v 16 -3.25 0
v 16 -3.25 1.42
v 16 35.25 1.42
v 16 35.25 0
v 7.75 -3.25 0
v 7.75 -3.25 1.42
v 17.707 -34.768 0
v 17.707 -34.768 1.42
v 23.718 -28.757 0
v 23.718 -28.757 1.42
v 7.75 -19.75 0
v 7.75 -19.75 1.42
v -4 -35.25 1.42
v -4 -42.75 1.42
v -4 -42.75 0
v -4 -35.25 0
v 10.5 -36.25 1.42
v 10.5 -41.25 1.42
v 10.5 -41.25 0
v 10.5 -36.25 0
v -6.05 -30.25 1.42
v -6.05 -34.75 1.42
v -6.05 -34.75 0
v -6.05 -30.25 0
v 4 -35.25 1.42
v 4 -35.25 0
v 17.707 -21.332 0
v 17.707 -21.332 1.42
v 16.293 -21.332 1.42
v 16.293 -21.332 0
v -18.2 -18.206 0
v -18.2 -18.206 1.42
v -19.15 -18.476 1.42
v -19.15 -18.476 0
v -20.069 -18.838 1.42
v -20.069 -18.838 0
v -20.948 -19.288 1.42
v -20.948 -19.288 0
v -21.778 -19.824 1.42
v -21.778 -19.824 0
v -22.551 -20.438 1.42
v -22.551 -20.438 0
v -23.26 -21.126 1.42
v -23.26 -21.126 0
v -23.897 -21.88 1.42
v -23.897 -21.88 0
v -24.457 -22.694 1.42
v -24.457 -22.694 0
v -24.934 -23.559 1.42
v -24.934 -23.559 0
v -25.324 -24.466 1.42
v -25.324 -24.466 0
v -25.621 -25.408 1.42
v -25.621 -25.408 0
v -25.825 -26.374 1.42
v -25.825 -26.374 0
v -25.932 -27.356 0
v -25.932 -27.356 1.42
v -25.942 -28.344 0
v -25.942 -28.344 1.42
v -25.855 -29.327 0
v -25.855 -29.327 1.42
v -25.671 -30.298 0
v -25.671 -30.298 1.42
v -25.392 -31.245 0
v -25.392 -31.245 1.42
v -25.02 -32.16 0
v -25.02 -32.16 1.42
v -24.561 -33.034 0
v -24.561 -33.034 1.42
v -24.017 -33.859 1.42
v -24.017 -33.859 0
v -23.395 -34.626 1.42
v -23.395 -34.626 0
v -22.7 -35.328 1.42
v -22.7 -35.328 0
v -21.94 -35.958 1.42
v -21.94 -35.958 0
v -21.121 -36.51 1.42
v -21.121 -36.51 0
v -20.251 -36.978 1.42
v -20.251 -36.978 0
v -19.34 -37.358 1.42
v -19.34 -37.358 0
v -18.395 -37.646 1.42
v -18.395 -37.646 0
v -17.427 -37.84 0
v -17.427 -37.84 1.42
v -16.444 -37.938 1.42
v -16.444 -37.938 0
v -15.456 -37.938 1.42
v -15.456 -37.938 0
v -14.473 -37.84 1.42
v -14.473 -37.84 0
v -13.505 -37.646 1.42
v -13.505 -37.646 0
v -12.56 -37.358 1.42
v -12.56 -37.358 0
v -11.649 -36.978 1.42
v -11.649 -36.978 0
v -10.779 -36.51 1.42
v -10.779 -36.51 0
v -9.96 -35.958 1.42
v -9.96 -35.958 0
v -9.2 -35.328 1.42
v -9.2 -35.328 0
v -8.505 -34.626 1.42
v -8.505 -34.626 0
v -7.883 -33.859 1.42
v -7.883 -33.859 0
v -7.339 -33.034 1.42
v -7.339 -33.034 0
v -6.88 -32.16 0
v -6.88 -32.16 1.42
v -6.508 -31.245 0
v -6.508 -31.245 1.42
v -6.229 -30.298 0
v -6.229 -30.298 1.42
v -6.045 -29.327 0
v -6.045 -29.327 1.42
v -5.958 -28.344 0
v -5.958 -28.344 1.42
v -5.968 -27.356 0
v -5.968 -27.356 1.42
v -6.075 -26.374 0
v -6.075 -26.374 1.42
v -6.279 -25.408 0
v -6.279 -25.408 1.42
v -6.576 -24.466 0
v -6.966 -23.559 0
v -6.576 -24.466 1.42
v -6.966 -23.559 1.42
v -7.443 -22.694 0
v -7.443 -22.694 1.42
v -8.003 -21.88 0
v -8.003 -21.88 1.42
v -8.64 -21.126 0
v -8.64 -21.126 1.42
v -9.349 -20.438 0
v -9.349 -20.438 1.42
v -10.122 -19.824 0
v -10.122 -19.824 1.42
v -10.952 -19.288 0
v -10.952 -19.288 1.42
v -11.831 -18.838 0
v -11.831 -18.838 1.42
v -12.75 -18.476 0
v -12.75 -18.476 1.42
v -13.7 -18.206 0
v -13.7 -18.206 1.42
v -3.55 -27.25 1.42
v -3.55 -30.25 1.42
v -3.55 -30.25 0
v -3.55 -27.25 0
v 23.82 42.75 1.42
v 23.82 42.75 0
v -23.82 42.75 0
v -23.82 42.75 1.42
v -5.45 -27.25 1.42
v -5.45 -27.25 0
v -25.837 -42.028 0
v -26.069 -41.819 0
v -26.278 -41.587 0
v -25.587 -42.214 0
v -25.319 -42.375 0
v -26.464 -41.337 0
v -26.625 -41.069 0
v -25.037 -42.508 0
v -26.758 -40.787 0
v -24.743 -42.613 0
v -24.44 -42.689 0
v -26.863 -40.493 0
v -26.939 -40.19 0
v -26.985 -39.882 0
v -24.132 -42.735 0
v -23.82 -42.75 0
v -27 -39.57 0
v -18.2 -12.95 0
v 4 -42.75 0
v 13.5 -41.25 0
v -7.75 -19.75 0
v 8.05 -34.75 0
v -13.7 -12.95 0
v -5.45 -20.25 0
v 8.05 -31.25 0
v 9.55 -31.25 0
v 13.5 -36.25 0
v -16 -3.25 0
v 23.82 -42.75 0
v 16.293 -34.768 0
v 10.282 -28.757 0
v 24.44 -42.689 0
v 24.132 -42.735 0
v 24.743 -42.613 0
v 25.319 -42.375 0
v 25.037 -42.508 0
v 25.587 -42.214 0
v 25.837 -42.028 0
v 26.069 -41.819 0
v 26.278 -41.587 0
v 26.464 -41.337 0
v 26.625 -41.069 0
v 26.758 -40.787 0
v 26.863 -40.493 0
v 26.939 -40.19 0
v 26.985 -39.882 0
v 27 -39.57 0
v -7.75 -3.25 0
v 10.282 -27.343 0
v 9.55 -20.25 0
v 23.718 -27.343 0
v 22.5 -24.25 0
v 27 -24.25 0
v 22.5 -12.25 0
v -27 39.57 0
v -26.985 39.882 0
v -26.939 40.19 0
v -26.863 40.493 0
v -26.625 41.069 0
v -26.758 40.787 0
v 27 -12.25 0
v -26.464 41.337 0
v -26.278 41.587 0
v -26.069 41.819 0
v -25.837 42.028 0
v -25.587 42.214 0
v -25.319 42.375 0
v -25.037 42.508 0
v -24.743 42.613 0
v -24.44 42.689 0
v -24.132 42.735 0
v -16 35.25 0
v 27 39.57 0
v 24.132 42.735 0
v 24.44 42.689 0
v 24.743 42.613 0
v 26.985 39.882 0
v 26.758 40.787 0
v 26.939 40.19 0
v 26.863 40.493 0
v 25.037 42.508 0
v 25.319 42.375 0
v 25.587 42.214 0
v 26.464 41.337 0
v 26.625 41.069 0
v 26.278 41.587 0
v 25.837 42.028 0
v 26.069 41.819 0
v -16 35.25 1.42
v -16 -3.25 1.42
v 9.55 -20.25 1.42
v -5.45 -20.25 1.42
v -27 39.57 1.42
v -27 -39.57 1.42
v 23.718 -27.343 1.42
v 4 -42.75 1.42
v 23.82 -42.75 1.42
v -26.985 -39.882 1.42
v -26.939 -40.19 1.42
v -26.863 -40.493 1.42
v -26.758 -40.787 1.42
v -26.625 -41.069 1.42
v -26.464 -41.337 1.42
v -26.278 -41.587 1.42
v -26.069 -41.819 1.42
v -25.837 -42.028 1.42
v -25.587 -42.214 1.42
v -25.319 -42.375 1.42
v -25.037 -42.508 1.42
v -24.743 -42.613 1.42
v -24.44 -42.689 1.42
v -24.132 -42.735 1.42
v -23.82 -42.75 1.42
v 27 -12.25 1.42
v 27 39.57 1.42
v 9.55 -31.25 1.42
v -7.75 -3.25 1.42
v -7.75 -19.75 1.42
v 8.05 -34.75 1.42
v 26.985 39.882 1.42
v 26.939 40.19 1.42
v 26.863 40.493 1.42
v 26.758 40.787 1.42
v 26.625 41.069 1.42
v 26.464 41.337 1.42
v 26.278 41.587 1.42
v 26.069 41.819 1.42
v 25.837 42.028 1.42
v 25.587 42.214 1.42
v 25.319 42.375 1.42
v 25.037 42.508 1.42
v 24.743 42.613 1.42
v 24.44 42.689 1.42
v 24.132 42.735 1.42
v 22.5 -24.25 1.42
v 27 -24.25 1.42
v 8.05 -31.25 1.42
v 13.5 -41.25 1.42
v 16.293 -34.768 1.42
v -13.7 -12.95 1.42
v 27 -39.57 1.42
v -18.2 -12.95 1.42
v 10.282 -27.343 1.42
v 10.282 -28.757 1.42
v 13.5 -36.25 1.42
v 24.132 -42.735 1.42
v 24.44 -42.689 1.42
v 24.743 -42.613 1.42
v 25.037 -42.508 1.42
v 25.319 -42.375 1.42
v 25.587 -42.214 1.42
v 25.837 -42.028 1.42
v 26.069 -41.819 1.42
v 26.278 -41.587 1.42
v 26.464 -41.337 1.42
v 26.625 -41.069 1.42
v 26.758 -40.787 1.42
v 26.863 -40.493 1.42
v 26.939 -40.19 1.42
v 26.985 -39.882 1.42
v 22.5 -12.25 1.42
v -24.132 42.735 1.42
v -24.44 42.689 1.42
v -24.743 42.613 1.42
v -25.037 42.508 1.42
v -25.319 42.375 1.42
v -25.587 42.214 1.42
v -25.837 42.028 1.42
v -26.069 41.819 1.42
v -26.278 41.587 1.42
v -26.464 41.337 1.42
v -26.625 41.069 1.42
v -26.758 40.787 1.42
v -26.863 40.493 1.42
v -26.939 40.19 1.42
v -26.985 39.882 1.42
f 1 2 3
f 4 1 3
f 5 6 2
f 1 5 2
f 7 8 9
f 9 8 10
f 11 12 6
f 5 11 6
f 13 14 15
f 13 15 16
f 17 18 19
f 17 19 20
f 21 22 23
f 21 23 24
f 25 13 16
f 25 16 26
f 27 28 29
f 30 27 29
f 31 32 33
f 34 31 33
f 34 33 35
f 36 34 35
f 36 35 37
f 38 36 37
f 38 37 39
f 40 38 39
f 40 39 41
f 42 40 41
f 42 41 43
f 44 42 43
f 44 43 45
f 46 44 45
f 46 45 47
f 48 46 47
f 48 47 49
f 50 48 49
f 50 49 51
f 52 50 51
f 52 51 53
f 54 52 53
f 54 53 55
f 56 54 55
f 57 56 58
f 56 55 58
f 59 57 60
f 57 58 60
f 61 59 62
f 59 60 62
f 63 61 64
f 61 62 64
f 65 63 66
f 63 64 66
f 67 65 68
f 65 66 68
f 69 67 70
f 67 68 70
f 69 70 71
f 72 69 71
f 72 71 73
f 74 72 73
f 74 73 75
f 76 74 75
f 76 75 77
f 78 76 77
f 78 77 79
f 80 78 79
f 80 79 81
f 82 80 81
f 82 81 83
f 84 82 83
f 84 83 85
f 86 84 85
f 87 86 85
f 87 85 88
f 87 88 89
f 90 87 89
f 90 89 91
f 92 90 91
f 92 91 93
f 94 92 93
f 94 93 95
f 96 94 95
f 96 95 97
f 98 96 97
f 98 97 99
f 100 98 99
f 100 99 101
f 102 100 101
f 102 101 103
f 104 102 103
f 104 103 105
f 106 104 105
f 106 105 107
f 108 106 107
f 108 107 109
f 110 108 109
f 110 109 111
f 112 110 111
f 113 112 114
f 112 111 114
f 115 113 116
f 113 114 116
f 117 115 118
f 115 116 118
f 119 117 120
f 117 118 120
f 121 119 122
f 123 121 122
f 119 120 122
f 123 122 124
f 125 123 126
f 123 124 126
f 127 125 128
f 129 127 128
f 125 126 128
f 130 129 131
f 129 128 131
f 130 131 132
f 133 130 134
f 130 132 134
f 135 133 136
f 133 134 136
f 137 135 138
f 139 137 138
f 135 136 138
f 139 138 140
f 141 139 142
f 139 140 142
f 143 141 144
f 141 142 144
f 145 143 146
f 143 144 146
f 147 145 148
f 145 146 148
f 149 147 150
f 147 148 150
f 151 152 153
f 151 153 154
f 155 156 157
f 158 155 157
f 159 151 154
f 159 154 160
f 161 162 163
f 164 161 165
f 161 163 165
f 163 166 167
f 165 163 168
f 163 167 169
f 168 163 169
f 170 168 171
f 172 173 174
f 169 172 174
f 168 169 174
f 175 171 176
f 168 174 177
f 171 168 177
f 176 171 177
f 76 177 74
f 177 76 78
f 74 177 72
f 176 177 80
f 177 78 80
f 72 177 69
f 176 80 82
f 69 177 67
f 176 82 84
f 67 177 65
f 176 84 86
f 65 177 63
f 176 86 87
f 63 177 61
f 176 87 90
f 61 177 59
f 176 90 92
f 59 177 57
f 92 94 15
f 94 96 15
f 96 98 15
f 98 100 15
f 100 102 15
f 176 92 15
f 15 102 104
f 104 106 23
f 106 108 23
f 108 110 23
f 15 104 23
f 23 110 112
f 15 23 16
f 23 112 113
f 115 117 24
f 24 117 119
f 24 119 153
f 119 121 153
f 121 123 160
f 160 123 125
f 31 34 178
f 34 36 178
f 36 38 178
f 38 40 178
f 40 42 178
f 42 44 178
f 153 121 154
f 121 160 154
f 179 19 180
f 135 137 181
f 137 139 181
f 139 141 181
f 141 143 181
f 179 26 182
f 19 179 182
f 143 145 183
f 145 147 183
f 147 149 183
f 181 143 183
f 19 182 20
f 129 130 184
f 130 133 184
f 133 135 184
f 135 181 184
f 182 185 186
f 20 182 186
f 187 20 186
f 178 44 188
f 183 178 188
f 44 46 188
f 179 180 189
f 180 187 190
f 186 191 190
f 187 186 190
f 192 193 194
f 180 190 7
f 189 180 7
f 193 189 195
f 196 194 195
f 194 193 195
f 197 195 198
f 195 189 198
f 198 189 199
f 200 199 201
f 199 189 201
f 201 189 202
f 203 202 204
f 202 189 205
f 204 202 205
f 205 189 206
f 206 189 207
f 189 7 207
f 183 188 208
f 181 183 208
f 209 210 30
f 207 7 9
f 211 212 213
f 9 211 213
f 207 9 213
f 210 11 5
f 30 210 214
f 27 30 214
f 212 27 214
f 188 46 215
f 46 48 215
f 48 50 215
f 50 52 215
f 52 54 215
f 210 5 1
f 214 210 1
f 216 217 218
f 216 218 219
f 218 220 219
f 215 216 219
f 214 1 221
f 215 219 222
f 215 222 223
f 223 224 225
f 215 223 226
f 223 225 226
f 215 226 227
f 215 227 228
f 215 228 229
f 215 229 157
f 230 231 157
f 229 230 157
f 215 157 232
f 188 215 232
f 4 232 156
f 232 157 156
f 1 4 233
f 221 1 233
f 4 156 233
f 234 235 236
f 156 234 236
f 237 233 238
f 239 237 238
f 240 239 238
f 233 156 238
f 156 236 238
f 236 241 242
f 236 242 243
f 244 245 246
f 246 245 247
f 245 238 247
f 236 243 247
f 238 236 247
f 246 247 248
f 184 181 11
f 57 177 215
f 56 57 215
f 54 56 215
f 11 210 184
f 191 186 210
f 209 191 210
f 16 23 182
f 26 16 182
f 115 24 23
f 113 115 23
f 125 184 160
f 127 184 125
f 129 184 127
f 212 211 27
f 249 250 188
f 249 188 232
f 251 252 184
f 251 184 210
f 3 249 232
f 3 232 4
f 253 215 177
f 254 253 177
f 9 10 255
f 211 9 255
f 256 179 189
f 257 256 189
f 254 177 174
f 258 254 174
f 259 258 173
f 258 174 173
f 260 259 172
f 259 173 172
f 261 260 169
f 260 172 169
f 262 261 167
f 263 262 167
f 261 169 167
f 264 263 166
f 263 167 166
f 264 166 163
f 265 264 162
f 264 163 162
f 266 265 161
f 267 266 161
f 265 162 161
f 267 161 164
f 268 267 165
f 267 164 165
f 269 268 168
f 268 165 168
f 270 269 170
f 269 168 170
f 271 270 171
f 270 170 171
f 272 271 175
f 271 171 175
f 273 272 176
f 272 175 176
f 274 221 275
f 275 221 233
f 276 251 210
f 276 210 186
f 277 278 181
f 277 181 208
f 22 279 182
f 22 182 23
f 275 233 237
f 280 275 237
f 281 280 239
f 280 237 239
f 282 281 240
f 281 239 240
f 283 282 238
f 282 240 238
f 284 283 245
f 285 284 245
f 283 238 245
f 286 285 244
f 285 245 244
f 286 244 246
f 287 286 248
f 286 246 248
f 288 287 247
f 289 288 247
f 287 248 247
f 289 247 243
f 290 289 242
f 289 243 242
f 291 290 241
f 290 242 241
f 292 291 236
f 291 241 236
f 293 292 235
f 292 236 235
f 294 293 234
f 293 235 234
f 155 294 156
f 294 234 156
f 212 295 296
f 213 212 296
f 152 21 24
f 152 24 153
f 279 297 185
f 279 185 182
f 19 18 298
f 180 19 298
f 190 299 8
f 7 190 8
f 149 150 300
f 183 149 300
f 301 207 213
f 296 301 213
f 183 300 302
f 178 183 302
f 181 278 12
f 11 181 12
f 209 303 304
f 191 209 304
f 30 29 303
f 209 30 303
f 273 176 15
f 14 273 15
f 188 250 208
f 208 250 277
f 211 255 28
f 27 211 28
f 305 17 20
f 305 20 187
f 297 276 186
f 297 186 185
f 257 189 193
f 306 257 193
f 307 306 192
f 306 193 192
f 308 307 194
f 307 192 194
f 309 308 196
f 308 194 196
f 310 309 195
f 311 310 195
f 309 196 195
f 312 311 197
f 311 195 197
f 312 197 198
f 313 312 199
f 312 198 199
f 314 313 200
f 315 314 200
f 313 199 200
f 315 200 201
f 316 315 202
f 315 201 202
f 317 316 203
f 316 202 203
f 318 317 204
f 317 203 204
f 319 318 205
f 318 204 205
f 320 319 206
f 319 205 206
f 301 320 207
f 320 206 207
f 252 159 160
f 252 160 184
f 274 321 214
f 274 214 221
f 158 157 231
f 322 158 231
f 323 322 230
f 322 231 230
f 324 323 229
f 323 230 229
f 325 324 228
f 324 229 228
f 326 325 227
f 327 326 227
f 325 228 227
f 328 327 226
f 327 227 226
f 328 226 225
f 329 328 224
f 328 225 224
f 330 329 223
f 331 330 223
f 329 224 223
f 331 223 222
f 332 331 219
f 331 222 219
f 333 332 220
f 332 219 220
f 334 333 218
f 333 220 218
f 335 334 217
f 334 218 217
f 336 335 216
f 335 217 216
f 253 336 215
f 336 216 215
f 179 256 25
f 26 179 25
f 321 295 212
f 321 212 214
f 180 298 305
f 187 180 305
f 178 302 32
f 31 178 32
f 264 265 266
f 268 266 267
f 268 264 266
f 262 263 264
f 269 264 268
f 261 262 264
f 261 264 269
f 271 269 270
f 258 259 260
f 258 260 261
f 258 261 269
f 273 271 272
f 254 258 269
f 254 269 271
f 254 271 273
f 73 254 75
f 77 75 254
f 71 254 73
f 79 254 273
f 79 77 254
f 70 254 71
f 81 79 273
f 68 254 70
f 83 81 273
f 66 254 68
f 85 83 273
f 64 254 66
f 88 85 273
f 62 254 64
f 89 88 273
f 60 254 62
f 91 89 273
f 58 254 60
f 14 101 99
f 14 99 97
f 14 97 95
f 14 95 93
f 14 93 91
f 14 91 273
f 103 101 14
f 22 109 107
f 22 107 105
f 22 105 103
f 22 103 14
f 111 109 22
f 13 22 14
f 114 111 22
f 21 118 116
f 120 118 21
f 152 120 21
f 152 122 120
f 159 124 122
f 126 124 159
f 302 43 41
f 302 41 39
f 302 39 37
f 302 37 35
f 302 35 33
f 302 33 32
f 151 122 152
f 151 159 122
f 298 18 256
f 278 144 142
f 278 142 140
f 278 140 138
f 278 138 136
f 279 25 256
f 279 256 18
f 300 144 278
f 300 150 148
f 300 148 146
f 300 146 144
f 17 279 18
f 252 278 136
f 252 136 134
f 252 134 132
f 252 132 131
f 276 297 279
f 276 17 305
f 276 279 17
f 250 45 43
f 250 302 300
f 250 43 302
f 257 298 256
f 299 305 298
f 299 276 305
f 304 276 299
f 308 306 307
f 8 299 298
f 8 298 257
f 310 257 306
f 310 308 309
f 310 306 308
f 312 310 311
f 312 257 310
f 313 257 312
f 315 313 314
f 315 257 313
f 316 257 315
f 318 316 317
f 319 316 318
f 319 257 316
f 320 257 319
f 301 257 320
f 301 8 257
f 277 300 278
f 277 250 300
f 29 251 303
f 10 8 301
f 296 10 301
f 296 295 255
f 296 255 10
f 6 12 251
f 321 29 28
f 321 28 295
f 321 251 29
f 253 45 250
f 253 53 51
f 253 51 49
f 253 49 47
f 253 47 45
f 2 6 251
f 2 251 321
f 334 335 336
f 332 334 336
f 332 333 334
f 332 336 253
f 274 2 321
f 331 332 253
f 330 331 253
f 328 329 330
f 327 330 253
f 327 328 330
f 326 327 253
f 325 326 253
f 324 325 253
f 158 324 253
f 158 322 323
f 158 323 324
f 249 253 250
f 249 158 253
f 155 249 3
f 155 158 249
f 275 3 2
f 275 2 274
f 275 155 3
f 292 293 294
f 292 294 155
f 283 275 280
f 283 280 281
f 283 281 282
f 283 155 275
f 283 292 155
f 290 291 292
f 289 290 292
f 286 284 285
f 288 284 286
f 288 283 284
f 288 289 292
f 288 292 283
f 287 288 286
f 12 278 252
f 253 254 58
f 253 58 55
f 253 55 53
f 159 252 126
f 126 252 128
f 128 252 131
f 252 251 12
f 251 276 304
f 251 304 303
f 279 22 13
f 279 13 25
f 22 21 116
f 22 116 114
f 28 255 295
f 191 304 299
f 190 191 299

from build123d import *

# Parameters (mm, degrees)
EXTRUDE_1_DEPTH     = 1.42
CUT_EXTRUDE_1_REACH = 52.582
SKETCH_2_W          = 32
SKETCH_2_H          = 38.5
SKETCH_2_W_2        = 15.5
SKETCH_2_H_2        = 16.5
CUT_EXTRUDE_2_REACH = 52.582
SKETCH_3_R          = 10
CUT_EXTRUDE_3_REACH = 52.582
CUT_EXTRUDE_4_REACH = 52.582
SKETCH_5_W          = 8
SKETCH_5_H          = 7.5
CUT_EXTRUDE_5_REACH = 52.582
SKETCH_6_W          = 3
SKETCH_6_H          = 5
CUT_EXTRUDE_6_REACH = 52.582
SKETCH_7_W          = 4.5
SKETCH_7_H          = 12


with BuildPart() as part:
    # 草图1 → 凸台-拉伸1 (new body)
    with BuildSketch(Plane.XY):
        with BuildLine():
            Line((-23.82, -42.75), (23.82, -42.75))
            ThreePointArc((23.82, -42.75), (26.068599564, -41.818599564), (27, -39.57))
            Line((27, -39.57), (27, 39.57))
            ThreePointArc((27, 39.57), (26.068599564, 41.818599564), (23.82, 42.75))
            Line((23.82, 42.75), (-23.82, 42.75))
            ThreePointArc((-23.82, 42.75), (-26.068599564, 41.818599564), (-27, 39.57))
            Line((-27, 39.57), (-27, -39.57))
            ThreePointArc((-27, -39.57), (-26.068599564, -41.818599564), (-23.82, -42.75))
        make_face()
    extrude(amount=EXTRUDE_1_DEPTH)

    # 草图2 → 切除-拉伸1 (cut, up to next)
    with BuildSketch(Plane.XY.offset(1.42), mode=Mode.PRIVATE) as cut_extrude_1_sk1:
        with Locations((0, 16)):
            Rectangle(SKETCH_2_W, SKETCH_2_H)
    cut_extrude_1_tool1 = extrude(cut_extrude_1_sk1.sketch, amount=-CUT_EXTRUDE_1_REACH, mode=Mode.PRIVATE) & part.part
    # 草图2 → 切除-拉伸1 (cut, up to next)
    with BuildSketch(Plane.XY.offset(1.42), mode=Mode.PRIVATE) as cut_extrude_1_sk2:
        with Locations((0, -11.5)):
            Rectangle(SKETCH_2_W_2, SKETCH_2_H_2)
    cut_extrude_1_tool2 = extrude(cut_extrude_1_sk2.sketch, amount=-CUT_EXTRUDE_1_REACH, mode=Mode.PRIVATE) & part.part
    add(cut_extrude_1_tool1.solids().sort_by_distance((0, 16, 1.42))[0], mode=Mode.SUBTRACT)
    add(cut_extrude_1_tool2.solids().sort_by_distance((0, -11.5, 1.42))[0], mode=Mode.SUBTRACT)

    # 草图3 → 切除-拉伸2 (cut, up to next)
    with BuildSketch(Plane.XY.offset(1.42), mode=Mode.PRIVATE) as cut_extrude_2_sk1:
        with Locations((-15.95, -27.95)):
            Circle(SKETCH_3_R)
    cut_extrude_2_tool1 = extrude(cut_extrude_2_sk1.sketch, amount=-CUT_EXTRUDE_2_REACH, mode=Mode.PRIVATE) & part.part
    # 草图3 → 切除-拉伸2 (cut, up to next)
    with BuildSketch(Plane.XY.offset(1.42), mode=Mode.PRIVATE) as cut_extrude_2_sk2:
        with BuildLine():
            Line((-18.2, -12.95), (-18.2, -18.206412365))
            ThreePointArc((-18.2, -18.206412365), (-15.95, -17.95), (-13.7, -18.206412365))
            Line((-13.7, -18.206412365), (-13.7, -12.95))
            Line((-13.7, -12.95), (-18.2, -12.95))
        make_face()
    cut_extrude_2_tool2 = extrude(cut_extrude_2_sk2.sketch, amount=-CUT_EXTRUDE_2_REACH, mode=Mode.PRIVATE) & part.part
    add(cut_extrude_2_tool1.solids().sort_by_distance((-15.95, -27.95, 1.42))[0], mode=Mode.SUBTRACT)
    add(cut_extrude_2_tool2.solids().sort_by_distance((-15.95, -15.493086, 1.42))[0], mode=Mode.SUBTRACT)

    # 草图4 → 切除-拉伸3 (cut, up to next)
    with BuildSketch(Plane.XY.offset(1.42), mode=Mode.PRIVATE) as cut_extrude_3_sk1:
        Polygon((-5.45, -20.25), (9.55, -20.25), (9.55, -31.25), (8.05, -31.25), (8.05, -34.75), (-6.05, -34.75), (-6.05, -30.25), (-3.55, -30.25), (-3.55, -27.25), (-5.45, -27.25), align=None)
    cut_extrude_3_tool1 = extrude(cut_extrude_3_sk1.sketch, amount=-CUT_EXTRUDE_3_REACH, mode=Mode.PRIVATE) & part.part
    add(cut_extrude_3_tool1.solids().sort_by_distance((1.958423, -27.392473, 1.42))[0], mode=Mode.SUBTRACT)

    # 草图5 → 切除-拉伸4 (cut, up to next)
    with BuildSketch(Plane.XY.offset(1.42), mode=Mode.PRIVATE) as cut_extrude_4_sk1:
        with Locations((0, -39)):
            Rectangle(SKETCH_5_W, SKETCH_5_H)
    cut_extrude_4_tool1 = extrude(cut_extrude_4_sk1.sketch, amount=-CUT_EXTRUDE_4_REACH, mode=Mode.PRIVATE) & part.part
    add(cut_extrude_4_tool1.solids().sort_by_distance((0, -39, 1.42))[0], mode=Mode.SUBTRACT)

    # 草图6 → 切除-拉伸5 (cut, up to next)
    with BuildSketch(Plane.XY.offset(1.42), mode=Mode.PRIVATE) as cut_extrude_5_sk1:
        with Locations((12, -38.75)):
            Rectangle(SKETCH_6_W, SKETCH_6_H)
    cut_extrude_5_tool1 = extrude(cut_extrude_5_sk1.sketch, amount=-CUT_EXTRUDE_5_REACH, mode=Mode.PRIVATE) & part.part
    # 草图6 → 切除-拉伸5 (cut, up to next)
    with BuildSketch(Plane.XY.offset(1.42), mode=Mode.PRIVATE) as cut_extrude_5_sk2:
        Polygon((17.707106781, -34.767514421), (23.717514421, -28.757106781), (23.717514421, -27.342893219), (17.707106781, -21.332485579), (16.292893219, -21.332485579), (10.282485579, -27.342893219), (10.282485579, -28.757106781), (16.292893219, -34.767514421), align=None)
    cut_extrude_5_tool2 = extrude(cut_extrude_5_sk2.sketch, amount=-CUT_EXTRUDE_5_REACH, mode=Mode.PRIVATE) & part.part
    add(cut_extrude_5_tool1.solids().sort_by_distance((12, -38.75, 1.42))[0], mode=Mode.SUBTRACT)
    add(cut_extrude_5_tool2.solids().sort_by_distance((17, -28.05, 1.42))[0], mode=Mode.SUBTRACT)

    # 草图7 → 切除-拉伸6 (cut, up to next)
    with BuildSketch(Plane.XY.offset(1.42), mode=Mode.PRIVATE) as cut_extrude_6_sk1:
        with Locations((24.75, -18.25)):
            Rectangle(SKETCH_7_W, SKETCH_7_H)
    cut_extrude_6_tool1 = extrude(cut_extrude_6_sk1.sketch, amount=-CUT_EXTRUDE_6_REACH, mode=Mode.PRIVATE) & part.part
    add(cut_extrude_6_tool1.solids().sort_by_distance((24.75, -18.25, 1.42))[0], mode=Mode.SUBTRACT)


solid = part.part
